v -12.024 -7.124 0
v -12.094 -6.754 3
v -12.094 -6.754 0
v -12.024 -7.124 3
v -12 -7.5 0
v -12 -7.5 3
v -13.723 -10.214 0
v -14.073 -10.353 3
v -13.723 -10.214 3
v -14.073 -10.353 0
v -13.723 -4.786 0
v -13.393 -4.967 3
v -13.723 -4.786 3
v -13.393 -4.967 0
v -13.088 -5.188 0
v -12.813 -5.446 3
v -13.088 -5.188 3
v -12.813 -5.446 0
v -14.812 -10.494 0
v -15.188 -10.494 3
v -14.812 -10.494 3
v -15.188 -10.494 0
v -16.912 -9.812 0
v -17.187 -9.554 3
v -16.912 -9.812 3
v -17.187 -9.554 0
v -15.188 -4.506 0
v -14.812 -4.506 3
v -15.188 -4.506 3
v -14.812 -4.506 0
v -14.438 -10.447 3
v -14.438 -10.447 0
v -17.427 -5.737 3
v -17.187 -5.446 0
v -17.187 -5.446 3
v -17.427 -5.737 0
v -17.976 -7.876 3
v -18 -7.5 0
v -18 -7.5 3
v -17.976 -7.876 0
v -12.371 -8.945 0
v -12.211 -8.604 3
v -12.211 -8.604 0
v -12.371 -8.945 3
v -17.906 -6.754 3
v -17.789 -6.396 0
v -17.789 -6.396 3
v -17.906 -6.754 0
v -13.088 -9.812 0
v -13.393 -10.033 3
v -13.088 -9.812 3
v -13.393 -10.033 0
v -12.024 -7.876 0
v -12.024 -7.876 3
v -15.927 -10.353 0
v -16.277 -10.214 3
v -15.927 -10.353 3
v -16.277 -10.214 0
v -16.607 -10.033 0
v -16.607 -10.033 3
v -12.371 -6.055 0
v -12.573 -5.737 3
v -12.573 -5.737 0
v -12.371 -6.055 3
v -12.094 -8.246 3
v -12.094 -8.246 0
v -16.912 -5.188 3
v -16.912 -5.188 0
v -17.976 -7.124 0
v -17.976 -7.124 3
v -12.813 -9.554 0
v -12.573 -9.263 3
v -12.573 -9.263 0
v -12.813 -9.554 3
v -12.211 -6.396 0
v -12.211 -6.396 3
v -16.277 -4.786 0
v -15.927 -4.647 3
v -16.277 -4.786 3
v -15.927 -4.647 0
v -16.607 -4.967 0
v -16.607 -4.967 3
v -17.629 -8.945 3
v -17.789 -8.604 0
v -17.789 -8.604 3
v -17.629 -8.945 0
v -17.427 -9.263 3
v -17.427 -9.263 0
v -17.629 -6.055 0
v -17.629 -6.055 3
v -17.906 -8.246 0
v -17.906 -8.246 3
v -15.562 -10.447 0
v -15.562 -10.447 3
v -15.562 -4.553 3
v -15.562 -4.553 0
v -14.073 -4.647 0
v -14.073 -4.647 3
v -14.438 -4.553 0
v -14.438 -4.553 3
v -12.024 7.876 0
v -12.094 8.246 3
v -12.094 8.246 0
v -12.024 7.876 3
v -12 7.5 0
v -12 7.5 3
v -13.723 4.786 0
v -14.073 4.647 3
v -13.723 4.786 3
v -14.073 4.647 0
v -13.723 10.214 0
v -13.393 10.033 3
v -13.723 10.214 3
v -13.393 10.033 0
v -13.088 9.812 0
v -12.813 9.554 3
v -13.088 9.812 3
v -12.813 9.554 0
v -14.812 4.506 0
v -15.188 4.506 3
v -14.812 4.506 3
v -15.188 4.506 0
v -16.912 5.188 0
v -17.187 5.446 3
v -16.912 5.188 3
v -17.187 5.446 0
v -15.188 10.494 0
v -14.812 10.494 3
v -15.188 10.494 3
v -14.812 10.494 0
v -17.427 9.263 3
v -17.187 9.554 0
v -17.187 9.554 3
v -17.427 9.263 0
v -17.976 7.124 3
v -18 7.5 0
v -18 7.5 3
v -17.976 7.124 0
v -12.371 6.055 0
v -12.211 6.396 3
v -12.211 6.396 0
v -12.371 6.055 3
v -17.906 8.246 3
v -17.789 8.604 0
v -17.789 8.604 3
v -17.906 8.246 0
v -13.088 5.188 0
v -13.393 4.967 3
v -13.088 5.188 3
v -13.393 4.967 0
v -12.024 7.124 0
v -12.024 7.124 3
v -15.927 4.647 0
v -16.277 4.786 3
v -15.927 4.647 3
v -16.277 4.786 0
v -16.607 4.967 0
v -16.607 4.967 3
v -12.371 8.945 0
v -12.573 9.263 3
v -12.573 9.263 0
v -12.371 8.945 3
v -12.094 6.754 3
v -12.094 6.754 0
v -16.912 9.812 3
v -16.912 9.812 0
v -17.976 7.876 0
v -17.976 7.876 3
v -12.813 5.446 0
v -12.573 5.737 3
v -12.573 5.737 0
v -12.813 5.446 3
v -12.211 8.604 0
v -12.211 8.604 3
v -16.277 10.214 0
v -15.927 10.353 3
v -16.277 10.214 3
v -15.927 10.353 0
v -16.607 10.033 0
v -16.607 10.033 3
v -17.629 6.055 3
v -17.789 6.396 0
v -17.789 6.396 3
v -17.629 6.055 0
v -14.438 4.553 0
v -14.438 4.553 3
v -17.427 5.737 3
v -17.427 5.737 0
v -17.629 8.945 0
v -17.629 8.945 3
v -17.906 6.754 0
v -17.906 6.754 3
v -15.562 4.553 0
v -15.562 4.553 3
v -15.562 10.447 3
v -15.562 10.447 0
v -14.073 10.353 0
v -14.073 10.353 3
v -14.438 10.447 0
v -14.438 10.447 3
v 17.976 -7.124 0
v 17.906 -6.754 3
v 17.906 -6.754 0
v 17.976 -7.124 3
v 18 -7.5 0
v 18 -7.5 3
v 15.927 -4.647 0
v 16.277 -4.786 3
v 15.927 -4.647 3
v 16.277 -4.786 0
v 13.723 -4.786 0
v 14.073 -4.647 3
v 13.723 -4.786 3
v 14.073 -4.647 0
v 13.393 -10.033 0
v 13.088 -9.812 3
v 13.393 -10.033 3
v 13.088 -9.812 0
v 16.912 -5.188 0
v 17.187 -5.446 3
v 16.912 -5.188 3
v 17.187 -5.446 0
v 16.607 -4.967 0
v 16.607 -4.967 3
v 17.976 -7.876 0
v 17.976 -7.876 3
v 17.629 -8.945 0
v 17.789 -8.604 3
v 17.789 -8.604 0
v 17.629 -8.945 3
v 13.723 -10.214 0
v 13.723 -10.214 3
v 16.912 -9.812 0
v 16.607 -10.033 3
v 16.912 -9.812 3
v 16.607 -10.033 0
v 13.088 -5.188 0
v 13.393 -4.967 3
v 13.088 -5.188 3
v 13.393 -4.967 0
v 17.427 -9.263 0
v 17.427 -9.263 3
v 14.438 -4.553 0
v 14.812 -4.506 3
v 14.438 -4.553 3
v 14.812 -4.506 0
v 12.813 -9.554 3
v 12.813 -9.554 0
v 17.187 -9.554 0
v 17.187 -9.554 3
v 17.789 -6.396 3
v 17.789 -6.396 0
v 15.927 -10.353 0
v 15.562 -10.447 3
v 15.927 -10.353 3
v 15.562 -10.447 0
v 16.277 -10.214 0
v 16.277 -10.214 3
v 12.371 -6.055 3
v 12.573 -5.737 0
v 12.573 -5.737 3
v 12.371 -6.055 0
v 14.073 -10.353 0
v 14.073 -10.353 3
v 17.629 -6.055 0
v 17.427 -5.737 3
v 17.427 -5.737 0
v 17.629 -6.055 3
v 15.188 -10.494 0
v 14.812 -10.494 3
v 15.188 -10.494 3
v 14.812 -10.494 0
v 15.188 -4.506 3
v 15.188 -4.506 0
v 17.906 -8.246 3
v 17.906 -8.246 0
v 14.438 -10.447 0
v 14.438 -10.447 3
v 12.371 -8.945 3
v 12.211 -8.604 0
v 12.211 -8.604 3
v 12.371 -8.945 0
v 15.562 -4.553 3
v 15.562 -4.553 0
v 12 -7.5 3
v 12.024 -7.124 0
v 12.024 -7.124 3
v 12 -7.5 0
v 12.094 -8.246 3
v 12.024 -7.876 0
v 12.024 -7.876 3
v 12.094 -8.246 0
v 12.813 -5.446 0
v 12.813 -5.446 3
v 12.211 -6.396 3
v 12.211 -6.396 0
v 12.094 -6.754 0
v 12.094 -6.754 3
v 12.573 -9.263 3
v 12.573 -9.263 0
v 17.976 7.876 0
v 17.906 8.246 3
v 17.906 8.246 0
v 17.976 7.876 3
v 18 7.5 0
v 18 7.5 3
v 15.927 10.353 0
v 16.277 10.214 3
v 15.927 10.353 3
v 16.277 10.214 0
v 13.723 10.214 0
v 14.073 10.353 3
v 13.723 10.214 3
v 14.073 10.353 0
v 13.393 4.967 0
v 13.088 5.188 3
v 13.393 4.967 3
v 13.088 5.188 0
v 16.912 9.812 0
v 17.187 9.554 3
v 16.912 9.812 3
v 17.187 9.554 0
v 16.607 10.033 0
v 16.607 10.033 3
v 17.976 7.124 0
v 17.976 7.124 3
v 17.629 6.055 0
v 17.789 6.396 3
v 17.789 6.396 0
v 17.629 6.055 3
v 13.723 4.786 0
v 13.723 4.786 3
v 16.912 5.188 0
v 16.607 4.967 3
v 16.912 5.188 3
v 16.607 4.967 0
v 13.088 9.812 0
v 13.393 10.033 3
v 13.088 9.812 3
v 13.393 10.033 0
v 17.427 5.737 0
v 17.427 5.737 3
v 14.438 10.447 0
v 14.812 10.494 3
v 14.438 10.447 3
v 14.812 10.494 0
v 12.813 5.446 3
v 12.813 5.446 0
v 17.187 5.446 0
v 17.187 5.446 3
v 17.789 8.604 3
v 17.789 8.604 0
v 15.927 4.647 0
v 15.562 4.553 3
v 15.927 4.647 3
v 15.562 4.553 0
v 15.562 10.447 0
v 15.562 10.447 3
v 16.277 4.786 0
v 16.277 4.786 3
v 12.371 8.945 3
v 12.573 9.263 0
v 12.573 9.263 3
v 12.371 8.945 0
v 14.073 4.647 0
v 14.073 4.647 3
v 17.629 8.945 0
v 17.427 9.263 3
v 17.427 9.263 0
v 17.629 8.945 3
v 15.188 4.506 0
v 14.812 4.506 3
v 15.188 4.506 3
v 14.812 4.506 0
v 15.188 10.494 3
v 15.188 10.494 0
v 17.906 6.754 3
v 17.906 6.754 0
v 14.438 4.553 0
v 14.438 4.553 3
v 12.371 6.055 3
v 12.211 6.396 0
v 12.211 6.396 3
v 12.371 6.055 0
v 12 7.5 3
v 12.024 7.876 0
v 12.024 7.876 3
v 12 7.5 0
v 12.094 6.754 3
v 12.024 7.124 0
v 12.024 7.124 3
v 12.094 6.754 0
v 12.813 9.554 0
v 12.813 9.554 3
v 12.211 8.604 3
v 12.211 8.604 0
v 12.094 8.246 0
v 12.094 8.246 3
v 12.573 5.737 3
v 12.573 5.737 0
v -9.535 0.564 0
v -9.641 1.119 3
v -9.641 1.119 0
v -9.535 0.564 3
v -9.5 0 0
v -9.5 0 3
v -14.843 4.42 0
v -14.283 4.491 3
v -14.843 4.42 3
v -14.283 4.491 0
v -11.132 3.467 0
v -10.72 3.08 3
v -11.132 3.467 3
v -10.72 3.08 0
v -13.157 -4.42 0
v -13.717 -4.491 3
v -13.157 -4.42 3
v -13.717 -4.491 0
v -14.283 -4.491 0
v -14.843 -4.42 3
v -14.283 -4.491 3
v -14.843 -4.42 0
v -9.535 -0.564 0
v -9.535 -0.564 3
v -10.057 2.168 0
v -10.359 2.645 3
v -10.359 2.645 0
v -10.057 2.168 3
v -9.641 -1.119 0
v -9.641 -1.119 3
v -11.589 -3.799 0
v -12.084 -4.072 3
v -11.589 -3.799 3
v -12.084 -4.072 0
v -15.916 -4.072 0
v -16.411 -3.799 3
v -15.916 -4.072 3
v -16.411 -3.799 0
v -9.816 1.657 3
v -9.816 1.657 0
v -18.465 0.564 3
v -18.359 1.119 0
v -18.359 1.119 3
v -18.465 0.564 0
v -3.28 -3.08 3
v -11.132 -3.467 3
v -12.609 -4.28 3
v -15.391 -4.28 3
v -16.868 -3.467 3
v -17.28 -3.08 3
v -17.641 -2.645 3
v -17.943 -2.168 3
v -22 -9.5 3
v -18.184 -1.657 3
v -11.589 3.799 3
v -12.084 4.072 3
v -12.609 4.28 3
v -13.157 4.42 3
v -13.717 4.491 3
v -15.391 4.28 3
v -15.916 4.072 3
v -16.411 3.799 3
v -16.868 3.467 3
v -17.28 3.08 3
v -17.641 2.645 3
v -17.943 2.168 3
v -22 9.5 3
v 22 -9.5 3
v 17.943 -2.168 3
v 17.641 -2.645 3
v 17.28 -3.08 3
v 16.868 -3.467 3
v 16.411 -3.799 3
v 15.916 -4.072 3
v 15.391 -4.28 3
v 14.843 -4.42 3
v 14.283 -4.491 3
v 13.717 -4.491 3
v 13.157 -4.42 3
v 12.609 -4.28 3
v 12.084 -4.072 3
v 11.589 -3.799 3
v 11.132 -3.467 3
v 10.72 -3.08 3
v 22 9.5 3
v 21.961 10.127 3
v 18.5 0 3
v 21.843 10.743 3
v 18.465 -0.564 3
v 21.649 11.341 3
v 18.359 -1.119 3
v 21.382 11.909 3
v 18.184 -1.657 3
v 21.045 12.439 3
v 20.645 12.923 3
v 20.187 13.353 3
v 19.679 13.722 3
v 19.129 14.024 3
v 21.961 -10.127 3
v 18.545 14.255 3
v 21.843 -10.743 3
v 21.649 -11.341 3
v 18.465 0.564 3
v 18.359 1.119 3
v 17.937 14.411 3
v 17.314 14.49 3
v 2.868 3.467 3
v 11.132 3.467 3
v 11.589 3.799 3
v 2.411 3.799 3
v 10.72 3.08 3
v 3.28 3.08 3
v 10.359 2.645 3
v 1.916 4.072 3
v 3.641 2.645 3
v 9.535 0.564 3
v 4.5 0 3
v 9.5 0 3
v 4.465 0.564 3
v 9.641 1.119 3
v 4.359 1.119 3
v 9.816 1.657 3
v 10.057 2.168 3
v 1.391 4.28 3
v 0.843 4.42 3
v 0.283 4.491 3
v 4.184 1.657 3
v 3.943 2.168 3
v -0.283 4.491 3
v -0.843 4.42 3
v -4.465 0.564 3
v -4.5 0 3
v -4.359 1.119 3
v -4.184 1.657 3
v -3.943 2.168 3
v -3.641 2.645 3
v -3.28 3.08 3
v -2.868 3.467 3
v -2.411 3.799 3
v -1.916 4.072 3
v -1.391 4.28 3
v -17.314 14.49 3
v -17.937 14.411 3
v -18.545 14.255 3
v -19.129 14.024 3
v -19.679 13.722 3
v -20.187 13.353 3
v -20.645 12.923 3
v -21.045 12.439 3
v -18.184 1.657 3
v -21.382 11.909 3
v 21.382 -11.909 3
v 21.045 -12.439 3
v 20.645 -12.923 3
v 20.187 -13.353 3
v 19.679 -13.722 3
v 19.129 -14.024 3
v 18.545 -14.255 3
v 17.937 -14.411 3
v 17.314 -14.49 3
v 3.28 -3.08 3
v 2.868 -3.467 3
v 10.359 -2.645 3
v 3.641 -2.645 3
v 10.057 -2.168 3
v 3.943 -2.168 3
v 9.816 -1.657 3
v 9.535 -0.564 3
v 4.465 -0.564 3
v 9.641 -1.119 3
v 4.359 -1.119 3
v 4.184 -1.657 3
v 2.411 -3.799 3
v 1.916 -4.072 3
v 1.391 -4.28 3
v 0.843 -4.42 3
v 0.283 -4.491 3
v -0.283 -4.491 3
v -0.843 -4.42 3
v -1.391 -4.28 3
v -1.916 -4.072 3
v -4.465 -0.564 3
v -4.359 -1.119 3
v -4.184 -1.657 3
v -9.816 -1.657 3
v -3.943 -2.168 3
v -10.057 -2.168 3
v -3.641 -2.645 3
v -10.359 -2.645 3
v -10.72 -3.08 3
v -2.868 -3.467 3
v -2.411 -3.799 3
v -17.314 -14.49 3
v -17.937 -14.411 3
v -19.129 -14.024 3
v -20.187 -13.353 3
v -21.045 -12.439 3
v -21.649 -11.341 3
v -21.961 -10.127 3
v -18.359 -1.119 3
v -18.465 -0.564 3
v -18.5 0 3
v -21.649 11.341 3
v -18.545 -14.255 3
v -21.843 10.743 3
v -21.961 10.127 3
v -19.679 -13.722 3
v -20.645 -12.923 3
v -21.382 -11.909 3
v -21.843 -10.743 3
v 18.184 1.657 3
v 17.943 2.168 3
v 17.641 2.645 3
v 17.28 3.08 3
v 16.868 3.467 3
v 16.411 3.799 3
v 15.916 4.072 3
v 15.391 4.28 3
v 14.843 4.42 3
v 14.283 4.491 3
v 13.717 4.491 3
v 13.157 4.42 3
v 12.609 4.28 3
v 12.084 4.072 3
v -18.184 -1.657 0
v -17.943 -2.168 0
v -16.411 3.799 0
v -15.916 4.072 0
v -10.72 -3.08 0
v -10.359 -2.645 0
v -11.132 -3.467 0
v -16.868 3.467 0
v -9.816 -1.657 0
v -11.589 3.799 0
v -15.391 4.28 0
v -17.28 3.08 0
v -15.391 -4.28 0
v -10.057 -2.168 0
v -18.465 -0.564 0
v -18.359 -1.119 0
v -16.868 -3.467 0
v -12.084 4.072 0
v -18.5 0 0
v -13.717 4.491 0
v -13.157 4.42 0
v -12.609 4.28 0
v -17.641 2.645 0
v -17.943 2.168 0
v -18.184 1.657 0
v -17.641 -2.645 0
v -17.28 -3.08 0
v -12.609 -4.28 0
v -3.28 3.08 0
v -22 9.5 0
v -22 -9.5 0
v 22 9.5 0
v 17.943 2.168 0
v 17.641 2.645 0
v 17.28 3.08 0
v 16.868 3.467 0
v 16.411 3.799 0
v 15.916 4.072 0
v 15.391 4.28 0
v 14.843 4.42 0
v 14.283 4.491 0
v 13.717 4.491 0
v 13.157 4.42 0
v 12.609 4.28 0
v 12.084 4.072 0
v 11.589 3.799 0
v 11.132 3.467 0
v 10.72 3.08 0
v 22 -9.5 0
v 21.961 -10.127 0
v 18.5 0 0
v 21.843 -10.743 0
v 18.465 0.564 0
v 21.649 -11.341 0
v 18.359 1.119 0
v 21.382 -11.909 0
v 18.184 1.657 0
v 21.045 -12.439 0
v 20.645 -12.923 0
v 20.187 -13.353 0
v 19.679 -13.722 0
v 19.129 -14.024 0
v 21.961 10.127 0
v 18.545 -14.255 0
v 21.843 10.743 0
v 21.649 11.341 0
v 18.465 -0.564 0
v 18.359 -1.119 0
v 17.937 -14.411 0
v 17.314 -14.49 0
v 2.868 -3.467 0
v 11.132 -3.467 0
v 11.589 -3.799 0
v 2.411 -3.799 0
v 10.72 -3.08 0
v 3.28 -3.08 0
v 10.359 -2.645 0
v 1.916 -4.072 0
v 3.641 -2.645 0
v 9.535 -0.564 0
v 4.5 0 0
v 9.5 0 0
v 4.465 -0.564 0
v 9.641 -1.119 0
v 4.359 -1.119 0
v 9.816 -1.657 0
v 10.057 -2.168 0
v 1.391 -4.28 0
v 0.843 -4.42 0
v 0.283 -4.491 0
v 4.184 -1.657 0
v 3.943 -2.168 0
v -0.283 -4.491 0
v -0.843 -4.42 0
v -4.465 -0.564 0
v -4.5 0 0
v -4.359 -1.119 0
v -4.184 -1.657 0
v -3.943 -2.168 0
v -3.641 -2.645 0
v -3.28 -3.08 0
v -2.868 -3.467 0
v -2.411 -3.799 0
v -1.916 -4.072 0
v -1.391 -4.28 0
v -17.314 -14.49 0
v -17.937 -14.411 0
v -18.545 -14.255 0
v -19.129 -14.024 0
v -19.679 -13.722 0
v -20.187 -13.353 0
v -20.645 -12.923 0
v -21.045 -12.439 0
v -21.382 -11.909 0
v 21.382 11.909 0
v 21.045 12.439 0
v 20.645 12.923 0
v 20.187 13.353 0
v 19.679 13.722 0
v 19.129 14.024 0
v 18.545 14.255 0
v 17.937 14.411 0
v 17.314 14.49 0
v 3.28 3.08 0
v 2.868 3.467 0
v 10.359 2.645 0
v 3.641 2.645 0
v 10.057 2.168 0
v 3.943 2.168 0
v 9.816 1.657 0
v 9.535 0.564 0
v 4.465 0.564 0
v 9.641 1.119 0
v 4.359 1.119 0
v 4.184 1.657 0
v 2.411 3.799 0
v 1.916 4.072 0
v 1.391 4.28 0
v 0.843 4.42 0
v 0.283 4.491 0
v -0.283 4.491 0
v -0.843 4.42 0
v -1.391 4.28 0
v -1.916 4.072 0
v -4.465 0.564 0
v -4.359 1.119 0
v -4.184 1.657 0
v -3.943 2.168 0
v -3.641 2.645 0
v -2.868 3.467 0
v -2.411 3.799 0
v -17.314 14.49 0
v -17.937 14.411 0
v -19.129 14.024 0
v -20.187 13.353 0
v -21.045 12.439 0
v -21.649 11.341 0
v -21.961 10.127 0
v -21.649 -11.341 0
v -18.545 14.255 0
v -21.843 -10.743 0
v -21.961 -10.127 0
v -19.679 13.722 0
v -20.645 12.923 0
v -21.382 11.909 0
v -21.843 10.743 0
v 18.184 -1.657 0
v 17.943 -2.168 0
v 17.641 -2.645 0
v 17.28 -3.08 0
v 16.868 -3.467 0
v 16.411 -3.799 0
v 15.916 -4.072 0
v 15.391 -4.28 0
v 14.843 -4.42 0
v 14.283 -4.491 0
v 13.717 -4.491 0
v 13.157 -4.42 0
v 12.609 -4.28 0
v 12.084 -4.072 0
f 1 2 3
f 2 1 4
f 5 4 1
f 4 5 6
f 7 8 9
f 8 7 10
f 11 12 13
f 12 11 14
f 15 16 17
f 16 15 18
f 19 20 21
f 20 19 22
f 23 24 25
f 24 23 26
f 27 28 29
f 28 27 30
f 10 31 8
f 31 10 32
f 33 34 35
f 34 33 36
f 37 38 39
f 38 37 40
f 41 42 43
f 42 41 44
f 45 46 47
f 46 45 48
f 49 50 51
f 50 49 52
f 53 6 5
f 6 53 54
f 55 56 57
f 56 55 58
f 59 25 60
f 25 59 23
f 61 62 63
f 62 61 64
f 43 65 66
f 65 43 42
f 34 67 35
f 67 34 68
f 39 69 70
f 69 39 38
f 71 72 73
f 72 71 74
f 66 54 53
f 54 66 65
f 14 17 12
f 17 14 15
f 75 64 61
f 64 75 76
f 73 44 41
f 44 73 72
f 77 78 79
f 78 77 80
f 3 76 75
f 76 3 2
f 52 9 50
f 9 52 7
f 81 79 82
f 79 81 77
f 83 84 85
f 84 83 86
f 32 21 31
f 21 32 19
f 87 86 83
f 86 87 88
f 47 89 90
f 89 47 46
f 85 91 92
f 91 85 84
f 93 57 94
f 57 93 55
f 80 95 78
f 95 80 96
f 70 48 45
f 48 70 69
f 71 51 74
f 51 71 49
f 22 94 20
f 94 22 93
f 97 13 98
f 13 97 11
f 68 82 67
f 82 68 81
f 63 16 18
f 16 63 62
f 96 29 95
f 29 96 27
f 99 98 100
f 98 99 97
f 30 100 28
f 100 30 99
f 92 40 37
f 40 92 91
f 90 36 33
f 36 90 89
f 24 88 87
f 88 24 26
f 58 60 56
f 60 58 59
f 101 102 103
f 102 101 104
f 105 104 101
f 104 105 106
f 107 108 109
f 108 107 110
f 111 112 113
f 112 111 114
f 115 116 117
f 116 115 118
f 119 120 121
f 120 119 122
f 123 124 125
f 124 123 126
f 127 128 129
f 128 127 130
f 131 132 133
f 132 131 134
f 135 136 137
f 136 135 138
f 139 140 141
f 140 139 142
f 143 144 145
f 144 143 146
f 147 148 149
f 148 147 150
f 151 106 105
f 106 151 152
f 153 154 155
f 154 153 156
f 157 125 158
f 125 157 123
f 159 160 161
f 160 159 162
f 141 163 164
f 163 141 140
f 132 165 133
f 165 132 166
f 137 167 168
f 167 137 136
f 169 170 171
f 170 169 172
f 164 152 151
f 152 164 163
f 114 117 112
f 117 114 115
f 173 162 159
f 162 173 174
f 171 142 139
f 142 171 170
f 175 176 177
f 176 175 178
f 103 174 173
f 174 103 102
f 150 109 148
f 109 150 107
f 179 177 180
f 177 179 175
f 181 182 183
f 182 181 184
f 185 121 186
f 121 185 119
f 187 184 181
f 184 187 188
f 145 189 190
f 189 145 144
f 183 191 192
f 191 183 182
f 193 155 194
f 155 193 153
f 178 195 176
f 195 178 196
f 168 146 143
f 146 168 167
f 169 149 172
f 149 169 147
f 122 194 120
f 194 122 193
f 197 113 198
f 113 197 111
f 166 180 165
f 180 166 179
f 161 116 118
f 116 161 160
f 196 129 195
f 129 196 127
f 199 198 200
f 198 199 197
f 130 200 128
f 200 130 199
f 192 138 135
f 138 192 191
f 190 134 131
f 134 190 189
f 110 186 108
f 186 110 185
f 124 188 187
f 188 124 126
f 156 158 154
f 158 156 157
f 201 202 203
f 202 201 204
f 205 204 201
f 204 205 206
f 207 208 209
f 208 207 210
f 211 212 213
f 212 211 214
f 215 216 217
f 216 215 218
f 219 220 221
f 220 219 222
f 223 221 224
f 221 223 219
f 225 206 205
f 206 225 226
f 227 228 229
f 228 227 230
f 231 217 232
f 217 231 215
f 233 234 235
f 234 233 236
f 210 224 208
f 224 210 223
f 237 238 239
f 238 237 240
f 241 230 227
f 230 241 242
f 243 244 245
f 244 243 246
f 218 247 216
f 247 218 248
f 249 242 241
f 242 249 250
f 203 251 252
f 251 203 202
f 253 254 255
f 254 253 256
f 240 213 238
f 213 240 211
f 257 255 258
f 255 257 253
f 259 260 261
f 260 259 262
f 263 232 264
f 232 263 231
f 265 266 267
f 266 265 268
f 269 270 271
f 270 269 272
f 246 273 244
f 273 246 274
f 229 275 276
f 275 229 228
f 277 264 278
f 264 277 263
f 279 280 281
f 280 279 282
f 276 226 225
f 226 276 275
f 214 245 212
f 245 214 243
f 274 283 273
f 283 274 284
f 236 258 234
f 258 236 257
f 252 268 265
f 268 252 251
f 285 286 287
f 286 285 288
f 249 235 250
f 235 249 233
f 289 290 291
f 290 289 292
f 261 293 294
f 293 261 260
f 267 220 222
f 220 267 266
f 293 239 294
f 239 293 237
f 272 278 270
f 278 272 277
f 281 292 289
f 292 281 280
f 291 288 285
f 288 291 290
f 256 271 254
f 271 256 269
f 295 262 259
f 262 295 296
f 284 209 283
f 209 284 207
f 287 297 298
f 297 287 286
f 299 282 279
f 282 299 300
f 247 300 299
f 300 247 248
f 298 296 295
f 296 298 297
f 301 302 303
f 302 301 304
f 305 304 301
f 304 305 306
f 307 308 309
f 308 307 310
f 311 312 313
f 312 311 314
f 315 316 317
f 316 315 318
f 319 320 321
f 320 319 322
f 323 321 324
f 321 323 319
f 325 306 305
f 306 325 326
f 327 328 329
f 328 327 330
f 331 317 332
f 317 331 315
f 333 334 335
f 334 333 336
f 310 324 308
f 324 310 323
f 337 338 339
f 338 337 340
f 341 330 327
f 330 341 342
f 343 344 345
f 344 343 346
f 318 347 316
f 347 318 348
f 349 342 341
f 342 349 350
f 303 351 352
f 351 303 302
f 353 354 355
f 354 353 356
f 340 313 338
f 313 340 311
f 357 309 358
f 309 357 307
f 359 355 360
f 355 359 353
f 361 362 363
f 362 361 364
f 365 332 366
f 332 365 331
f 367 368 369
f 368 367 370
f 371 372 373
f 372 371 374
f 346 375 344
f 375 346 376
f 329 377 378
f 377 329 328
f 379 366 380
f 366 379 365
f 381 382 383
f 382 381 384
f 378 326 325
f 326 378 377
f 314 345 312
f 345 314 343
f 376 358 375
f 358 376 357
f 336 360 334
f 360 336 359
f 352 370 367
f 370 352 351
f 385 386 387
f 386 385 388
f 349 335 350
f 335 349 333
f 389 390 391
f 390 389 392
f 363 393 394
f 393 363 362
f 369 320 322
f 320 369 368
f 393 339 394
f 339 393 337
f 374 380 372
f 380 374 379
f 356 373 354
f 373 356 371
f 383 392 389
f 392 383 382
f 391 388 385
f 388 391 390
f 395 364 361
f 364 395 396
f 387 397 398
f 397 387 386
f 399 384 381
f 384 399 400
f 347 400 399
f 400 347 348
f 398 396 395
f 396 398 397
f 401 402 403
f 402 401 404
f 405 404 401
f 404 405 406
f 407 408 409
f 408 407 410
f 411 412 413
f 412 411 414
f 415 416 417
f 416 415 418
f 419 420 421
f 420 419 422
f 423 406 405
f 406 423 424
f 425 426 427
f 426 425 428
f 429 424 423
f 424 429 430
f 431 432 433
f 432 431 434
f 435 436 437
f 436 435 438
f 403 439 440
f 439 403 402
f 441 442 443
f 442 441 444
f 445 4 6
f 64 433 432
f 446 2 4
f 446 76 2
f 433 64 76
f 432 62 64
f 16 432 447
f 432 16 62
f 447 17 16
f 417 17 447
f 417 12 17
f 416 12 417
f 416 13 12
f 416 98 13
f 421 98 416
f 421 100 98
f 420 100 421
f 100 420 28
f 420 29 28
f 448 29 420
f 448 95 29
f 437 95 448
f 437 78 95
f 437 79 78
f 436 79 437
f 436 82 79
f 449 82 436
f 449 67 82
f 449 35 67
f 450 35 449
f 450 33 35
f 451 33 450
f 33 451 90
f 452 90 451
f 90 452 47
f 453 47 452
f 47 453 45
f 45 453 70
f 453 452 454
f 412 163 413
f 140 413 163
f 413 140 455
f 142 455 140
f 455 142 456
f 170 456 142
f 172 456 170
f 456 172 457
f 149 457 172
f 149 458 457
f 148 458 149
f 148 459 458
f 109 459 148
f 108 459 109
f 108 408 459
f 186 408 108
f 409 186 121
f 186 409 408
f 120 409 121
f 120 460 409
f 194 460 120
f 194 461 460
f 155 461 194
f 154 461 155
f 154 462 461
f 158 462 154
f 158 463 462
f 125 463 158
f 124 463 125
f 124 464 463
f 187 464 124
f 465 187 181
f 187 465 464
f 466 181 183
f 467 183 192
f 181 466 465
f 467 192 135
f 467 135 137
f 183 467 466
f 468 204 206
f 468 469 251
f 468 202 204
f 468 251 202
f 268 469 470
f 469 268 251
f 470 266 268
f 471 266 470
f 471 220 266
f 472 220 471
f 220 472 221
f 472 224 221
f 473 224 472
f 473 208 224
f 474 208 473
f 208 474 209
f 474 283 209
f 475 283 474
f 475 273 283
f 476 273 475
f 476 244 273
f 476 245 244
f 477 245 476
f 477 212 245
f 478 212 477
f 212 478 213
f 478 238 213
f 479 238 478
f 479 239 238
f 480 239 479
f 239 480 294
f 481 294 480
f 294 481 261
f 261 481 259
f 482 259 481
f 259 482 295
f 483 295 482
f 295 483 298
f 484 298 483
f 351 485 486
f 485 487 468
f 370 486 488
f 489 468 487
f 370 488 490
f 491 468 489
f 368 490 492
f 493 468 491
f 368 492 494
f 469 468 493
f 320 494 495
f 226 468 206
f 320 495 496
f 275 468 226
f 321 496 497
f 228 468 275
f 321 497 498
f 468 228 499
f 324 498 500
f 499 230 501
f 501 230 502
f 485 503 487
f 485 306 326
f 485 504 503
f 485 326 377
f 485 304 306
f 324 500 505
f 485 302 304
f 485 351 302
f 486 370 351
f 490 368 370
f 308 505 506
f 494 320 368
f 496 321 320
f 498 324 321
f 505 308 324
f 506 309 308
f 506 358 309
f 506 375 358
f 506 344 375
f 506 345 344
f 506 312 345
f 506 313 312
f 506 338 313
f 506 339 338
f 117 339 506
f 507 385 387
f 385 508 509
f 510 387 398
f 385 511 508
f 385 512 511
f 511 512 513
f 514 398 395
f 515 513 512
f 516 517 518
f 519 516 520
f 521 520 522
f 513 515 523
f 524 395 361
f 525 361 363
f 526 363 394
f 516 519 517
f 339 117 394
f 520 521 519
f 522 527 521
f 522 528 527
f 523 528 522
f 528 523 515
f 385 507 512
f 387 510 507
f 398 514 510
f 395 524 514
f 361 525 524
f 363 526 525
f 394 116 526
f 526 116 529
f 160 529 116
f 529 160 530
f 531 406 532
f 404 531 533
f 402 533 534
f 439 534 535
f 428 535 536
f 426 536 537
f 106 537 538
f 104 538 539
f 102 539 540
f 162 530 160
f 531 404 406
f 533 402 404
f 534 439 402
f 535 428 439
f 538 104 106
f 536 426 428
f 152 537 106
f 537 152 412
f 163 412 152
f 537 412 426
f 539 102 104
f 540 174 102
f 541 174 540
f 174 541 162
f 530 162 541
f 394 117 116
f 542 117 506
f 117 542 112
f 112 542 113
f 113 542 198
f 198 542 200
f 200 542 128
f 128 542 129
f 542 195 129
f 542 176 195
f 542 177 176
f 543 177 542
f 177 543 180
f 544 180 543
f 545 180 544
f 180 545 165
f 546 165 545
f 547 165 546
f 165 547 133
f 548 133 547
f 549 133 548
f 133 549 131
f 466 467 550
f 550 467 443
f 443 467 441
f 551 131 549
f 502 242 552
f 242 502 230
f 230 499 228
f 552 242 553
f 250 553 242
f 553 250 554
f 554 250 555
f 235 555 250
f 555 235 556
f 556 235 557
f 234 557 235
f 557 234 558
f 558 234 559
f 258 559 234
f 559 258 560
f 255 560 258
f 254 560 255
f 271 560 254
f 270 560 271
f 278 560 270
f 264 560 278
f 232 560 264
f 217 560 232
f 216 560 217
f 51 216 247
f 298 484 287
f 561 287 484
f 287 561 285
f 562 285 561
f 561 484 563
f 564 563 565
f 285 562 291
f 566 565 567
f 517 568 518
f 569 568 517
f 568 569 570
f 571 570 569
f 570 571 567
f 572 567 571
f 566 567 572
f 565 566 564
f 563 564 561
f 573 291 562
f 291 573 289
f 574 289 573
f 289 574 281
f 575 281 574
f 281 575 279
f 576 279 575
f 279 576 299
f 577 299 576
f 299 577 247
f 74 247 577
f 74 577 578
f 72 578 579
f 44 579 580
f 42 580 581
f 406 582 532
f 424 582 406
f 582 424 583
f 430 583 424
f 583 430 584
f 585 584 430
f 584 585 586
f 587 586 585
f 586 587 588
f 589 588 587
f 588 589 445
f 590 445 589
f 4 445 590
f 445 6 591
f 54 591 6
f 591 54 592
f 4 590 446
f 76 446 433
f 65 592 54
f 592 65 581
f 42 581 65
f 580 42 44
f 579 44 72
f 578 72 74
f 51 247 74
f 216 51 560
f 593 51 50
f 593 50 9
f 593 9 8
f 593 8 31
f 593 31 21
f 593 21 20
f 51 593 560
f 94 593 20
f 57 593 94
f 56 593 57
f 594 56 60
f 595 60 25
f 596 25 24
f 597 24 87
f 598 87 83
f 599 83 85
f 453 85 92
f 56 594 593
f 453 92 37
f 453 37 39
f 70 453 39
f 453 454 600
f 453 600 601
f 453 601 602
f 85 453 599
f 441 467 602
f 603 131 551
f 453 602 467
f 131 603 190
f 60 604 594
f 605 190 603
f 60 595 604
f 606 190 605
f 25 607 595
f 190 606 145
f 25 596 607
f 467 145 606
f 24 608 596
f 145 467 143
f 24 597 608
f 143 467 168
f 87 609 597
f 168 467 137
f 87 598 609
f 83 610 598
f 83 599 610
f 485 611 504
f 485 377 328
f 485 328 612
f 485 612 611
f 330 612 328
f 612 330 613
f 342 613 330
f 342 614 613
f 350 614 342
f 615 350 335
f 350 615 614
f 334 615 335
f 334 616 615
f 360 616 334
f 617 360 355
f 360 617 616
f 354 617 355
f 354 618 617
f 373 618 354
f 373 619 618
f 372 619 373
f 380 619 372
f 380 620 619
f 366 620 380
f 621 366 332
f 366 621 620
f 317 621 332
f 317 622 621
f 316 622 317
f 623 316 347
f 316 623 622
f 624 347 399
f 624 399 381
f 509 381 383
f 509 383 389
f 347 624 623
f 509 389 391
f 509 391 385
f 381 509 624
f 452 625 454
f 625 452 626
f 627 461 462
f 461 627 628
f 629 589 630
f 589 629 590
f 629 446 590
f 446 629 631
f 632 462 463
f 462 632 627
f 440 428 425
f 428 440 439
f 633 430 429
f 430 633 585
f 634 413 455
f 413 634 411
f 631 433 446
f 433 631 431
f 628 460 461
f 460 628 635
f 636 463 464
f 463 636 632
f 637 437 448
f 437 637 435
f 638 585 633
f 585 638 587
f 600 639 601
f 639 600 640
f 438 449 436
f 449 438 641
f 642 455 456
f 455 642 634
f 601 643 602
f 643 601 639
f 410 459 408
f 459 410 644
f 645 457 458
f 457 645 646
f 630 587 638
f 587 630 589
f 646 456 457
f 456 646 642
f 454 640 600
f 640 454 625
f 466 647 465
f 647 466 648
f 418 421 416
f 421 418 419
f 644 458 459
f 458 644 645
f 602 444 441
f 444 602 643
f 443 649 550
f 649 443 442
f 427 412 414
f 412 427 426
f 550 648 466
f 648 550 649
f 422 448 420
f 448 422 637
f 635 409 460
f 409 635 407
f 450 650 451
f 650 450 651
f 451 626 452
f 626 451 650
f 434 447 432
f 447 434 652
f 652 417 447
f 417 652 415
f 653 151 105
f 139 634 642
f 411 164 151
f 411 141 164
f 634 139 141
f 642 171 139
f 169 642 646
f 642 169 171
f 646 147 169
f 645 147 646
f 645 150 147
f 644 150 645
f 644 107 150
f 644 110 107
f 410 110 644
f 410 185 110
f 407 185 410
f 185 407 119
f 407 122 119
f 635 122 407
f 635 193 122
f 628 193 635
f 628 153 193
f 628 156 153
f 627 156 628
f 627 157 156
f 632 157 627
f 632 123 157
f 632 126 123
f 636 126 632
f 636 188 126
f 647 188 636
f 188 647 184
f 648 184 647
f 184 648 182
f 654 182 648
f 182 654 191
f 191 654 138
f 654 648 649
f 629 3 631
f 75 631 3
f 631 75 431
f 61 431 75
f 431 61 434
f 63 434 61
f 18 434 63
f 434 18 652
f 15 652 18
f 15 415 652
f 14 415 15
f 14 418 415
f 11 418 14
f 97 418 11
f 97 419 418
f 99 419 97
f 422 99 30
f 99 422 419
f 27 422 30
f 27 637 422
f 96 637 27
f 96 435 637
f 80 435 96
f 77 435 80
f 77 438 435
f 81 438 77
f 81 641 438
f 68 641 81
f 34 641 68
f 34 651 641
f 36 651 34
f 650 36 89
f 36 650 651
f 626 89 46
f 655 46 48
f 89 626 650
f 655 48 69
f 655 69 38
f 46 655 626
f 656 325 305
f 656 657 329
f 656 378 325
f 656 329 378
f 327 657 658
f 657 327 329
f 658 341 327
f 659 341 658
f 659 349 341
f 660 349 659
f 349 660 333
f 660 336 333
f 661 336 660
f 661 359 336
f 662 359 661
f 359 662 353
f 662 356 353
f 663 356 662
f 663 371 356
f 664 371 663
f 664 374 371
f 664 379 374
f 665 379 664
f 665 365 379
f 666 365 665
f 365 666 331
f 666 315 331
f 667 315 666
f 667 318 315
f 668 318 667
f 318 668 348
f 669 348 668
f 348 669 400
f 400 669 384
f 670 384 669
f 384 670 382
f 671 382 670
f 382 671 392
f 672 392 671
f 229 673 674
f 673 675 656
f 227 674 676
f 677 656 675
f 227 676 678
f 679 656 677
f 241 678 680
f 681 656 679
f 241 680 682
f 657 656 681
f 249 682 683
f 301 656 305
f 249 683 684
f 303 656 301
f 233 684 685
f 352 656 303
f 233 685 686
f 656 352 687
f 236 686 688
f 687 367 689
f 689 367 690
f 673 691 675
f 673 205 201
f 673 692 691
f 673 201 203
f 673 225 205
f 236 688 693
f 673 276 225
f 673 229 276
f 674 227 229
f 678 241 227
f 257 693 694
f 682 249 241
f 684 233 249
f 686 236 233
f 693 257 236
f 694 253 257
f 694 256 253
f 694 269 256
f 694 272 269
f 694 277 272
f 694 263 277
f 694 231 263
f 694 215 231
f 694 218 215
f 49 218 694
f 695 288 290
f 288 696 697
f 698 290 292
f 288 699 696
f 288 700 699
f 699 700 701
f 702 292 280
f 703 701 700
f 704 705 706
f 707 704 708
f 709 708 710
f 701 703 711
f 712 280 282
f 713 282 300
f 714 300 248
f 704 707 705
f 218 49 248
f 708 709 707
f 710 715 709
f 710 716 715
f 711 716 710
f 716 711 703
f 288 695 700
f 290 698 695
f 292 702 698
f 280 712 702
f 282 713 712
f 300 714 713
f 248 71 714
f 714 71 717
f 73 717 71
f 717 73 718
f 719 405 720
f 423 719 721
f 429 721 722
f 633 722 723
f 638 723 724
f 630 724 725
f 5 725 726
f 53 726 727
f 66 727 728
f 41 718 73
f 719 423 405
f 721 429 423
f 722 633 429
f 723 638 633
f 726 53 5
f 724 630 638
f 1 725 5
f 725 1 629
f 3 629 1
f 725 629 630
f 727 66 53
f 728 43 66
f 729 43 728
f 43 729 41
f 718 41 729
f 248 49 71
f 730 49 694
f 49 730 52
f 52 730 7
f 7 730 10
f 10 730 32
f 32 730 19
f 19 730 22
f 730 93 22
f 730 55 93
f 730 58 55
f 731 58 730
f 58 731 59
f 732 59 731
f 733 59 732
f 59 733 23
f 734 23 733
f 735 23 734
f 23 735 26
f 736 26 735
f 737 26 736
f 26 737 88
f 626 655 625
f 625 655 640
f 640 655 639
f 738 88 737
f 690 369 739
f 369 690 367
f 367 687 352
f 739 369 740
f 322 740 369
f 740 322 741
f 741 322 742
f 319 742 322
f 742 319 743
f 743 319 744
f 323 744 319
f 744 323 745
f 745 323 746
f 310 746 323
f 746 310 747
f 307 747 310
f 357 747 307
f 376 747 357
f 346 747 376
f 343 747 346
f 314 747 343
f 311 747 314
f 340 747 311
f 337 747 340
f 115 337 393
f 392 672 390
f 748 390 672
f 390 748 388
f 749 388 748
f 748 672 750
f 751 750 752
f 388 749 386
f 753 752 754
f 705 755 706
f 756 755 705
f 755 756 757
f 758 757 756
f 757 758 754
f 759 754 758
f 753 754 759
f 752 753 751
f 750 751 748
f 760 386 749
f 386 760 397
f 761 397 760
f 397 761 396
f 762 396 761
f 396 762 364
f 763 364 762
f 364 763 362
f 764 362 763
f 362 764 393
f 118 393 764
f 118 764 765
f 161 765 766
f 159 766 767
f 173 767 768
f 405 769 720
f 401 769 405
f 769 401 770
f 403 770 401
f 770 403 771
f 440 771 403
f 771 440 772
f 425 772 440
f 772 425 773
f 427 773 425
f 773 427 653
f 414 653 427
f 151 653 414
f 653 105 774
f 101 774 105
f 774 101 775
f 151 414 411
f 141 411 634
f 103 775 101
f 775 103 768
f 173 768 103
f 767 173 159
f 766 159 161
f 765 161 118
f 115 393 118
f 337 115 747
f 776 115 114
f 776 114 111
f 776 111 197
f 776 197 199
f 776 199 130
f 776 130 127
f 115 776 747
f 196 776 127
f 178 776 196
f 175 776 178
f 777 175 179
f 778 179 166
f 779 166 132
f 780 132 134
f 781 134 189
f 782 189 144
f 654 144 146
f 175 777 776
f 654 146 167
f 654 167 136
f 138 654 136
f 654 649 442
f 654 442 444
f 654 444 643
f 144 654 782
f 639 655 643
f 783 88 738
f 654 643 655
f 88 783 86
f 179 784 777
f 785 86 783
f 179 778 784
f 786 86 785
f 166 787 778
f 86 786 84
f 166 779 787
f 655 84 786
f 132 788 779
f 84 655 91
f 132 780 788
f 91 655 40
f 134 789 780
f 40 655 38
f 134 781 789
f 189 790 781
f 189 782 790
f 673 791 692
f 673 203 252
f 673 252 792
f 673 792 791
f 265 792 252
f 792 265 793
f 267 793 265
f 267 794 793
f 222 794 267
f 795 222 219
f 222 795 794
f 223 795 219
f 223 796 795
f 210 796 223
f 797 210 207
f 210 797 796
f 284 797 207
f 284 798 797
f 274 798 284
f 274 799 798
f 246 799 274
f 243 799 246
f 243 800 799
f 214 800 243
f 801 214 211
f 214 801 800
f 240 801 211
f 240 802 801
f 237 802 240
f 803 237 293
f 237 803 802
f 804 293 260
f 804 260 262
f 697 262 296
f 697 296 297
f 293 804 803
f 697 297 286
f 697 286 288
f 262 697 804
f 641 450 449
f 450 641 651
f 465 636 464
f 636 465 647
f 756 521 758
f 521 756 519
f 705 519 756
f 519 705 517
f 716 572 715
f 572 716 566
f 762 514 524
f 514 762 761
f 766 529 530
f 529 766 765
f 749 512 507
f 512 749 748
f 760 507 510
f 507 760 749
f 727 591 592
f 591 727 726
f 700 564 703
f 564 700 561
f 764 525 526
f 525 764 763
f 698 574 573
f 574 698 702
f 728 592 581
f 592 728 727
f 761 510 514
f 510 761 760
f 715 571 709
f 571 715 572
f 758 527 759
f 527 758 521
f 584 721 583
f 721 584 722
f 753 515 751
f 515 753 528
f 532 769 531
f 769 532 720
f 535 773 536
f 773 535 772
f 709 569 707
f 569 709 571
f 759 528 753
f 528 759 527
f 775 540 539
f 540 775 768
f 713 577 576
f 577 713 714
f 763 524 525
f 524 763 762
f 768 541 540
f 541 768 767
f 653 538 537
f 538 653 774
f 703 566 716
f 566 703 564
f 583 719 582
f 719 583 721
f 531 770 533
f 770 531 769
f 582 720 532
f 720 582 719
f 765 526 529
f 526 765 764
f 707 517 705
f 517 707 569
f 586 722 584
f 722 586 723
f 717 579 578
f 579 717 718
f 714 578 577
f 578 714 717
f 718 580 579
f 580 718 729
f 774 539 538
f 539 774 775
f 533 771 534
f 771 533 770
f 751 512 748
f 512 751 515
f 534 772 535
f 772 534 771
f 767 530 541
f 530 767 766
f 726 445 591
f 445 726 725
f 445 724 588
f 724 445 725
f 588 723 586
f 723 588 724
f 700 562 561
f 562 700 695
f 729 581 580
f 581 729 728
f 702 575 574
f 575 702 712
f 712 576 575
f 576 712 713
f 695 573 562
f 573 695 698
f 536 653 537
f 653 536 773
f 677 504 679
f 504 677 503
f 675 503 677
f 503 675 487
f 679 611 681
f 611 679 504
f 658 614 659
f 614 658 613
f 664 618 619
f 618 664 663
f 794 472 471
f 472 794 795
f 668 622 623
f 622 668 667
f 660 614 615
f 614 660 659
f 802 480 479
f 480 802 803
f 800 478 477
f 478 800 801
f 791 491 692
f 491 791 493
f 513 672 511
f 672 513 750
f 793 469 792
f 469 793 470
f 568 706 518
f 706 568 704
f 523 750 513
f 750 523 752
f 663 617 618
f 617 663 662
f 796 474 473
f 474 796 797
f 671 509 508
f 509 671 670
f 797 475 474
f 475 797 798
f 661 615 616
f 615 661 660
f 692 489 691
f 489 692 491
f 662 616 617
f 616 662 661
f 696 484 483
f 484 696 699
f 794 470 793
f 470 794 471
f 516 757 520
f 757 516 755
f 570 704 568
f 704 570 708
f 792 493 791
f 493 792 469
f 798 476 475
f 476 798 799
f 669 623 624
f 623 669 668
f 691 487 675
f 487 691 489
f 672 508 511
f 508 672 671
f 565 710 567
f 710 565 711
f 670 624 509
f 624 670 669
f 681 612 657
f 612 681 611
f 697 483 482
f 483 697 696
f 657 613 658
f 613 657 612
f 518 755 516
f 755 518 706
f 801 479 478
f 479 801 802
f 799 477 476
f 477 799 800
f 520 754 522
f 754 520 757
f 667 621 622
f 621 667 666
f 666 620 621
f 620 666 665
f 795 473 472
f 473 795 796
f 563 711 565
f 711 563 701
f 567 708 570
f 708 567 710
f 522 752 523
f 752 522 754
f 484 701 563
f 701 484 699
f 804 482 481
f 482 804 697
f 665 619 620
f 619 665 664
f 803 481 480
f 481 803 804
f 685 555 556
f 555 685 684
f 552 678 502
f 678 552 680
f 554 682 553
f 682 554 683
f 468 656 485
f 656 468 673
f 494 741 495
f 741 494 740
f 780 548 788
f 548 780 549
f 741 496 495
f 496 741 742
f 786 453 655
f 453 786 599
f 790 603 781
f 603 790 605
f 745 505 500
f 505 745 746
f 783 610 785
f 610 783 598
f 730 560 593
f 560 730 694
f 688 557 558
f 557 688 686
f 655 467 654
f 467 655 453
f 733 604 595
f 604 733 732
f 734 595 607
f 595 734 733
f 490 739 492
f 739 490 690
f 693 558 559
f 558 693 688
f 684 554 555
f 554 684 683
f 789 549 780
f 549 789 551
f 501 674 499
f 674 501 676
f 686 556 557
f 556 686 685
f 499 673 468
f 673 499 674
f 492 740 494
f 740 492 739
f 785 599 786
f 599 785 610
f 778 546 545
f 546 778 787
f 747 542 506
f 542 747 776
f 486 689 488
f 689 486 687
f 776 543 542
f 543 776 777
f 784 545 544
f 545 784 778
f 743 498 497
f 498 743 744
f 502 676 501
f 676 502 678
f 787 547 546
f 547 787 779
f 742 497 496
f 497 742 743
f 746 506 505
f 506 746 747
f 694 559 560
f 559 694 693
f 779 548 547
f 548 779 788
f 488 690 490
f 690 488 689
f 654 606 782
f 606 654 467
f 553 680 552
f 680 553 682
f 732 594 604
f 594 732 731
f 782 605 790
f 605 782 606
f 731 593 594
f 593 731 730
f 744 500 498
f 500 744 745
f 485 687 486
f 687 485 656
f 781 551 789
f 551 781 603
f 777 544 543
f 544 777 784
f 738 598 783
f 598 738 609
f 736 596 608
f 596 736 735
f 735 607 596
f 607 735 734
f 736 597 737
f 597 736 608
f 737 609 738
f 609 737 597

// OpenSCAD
$fn = 50;


difference() {
	union() {
		hull() {
			translate(v = [-17.0000000000, 9.5000000000, 0]) {
				cylinder(h = 3, r = 5);
			}
			translate(v = [17.0000000000, 9.5000000000, 0]) {
				cylinder(h = 3, r = 5);
			}
			translate(v = [-17.0000000000, -9.5000000000, 0]) {
				cylinder(h = 3, r = 5);
			}
			translate(v = [17.0000000000, -9.5000000000, 0]) {
				cylinder(h = 3, r = 5);
			}
		}
	}
	union() {
		#translate(v = [-15.0000000000, -7.5000000000, -100.0000000000]) {
			cylinder(h = 200, r = 3.0000000000);
		}
		#translate(v = [-15.0000000000, 7.5000000000, -100.0000000000]) {
			cylinder(h = 200, r = 3.0000000000);
		}
		#translate(v = [15.0000000000, -7.5000000000, -100.0000000000]) {
			cylinder(h = 200, r = 3.0000000000);
		}
		#translate(v = [15.0000000000, 7.5000000000, -100.0000000000]) {
			cylinder(h = 200, r = 3.0000000000);
		}
		#translate(v = [-14.0000000000, 0, 0]) {
			cylinder(h = 3, r = 4.5000000000);
		}
		#cylinder(h = 3, r = 4.5000000000);
		#translate(v = [14.0000000000, 0, 0]) {
			cylinder(h = 3, r = 4.5000000000);
		}
	}
}
